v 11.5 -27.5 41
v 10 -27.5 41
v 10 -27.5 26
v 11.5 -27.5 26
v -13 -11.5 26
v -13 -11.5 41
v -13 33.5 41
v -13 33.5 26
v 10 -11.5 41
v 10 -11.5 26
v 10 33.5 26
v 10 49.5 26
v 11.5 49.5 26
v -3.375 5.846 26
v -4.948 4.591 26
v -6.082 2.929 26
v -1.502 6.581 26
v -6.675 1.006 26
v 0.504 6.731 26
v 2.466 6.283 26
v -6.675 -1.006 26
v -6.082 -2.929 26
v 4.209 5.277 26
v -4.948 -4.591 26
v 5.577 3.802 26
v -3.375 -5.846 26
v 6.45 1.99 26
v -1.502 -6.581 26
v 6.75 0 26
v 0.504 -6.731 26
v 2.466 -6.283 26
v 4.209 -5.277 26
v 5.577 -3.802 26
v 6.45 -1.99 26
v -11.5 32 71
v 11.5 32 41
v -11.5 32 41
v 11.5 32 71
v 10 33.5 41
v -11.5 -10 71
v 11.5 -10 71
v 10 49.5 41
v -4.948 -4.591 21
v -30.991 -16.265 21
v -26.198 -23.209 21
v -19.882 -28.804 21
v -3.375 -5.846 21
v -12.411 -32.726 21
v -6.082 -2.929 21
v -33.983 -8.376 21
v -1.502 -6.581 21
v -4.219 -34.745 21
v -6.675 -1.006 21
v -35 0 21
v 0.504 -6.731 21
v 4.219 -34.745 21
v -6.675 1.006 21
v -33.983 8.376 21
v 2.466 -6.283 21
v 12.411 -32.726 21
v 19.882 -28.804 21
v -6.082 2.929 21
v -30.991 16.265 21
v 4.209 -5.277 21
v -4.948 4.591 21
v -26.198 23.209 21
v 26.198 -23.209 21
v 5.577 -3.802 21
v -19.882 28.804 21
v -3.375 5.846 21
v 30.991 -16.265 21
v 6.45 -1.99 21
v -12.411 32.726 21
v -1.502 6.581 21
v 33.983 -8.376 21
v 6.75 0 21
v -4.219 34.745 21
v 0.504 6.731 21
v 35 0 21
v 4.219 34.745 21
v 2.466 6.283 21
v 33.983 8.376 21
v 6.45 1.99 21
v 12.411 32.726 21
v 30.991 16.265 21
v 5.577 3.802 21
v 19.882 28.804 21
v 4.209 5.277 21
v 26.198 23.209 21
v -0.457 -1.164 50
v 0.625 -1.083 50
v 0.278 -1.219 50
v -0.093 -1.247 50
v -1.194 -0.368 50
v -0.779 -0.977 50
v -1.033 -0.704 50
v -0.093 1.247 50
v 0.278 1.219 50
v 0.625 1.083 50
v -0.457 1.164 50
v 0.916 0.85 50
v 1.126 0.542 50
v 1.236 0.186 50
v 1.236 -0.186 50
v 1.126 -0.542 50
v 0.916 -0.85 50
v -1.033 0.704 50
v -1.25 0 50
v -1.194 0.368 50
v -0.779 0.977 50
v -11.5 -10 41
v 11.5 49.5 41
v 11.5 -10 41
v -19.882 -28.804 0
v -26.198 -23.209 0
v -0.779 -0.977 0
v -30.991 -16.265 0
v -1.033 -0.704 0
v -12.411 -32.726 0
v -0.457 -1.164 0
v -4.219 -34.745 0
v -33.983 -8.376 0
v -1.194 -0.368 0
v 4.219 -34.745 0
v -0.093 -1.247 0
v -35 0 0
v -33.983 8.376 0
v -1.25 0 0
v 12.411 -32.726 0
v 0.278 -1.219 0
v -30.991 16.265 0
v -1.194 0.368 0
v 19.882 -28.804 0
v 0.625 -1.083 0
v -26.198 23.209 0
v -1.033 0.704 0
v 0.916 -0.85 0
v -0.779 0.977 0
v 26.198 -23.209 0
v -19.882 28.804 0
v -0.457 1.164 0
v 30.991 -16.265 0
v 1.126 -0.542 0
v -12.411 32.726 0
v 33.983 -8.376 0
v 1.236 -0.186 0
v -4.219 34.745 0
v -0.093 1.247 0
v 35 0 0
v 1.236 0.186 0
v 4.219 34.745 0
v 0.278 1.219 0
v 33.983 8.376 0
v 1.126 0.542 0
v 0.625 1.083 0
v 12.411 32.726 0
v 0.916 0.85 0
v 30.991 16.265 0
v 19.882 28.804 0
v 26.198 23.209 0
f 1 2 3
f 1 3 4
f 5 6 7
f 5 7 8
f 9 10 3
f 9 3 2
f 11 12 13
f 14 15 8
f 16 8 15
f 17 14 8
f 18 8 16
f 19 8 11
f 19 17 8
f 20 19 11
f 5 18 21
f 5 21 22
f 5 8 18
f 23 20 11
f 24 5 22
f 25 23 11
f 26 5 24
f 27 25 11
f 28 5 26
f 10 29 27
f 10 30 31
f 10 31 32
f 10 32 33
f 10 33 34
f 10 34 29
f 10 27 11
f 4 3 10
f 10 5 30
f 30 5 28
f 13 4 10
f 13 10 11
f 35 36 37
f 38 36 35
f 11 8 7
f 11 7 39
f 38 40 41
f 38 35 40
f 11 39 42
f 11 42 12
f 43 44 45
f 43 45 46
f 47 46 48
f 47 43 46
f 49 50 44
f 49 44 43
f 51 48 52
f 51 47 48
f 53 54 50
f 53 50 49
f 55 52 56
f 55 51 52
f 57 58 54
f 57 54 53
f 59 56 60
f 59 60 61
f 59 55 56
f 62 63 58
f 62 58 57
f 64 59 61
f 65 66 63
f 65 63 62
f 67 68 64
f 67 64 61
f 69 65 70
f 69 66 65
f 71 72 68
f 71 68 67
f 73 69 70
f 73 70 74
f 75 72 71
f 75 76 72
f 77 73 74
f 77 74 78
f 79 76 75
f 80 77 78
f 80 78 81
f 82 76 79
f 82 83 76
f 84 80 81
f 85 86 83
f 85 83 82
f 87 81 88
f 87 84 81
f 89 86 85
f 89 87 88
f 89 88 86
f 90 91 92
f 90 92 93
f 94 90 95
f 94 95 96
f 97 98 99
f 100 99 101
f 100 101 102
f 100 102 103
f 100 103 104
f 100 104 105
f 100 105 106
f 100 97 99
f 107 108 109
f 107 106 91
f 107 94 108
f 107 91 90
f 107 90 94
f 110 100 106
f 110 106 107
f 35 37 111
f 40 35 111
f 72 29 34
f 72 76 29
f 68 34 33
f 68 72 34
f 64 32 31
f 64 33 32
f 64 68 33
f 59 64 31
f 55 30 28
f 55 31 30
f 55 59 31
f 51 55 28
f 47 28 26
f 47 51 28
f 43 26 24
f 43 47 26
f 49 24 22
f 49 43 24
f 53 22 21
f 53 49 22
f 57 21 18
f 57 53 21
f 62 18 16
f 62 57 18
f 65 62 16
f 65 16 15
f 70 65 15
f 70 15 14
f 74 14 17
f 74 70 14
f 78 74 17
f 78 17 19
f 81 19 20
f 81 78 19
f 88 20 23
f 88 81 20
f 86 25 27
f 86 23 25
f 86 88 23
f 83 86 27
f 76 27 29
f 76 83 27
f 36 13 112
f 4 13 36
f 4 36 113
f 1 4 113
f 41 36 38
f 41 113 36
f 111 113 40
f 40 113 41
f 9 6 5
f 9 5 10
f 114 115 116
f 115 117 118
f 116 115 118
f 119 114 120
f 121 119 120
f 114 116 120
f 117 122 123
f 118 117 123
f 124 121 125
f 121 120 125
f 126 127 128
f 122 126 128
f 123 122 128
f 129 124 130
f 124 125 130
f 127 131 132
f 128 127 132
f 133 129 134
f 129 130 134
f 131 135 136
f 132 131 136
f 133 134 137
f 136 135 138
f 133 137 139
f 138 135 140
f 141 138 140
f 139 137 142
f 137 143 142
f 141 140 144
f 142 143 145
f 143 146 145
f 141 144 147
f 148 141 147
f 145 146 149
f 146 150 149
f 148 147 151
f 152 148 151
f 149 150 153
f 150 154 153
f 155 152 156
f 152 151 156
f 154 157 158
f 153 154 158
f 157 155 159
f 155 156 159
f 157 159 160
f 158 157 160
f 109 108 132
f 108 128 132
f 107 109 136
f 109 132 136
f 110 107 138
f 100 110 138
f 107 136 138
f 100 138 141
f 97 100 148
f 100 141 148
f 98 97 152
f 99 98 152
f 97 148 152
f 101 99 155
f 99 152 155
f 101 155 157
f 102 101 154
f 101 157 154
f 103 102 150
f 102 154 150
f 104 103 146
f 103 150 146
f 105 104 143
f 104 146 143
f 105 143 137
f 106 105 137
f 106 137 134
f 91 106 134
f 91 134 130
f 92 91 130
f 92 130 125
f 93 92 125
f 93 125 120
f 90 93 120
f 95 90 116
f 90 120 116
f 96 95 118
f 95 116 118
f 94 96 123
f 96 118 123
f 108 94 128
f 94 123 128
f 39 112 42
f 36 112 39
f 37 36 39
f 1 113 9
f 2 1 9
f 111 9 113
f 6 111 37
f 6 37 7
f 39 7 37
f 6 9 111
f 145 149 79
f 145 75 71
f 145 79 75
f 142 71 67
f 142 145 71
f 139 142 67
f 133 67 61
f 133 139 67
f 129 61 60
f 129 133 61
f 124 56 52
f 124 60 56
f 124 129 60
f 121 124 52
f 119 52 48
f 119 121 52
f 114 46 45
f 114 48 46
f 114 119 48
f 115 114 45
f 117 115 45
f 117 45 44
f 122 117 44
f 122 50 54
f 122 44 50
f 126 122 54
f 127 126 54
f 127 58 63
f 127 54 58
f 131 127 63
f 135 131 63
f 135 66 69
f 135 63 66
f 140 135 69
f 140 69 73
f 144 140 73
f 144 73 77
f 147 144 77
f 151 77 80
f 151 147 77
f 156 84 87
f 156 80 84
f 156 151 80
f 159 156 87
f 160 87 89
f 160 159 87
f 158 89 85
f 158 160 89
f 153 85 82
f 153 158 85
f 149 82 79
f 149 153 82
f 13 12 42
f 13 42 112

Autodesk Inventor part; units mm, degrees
ref_plane "YZ Plane" through (0, 0, 0) normal (1, 0, 0) x (0, 1, 0)
ref_plane "XZ Plane" through (0, 0, 0) normal (0, 1, 0) x (-1, 0, 0)
ref_plane "XY Plane" through (0, 0, 0) normal (0, 0, 1) x (1, 0, 0)
sketch "Sketch1" plane through (0, 0, 0) normal (0, 0, 1) x (1, 0, 0)
  circle A0 centre (0, 0) radius 35
  dimension "d0" = 70
extrude "Extrusion1" add sketch "Sketch1" along normal blind 21
sketch "Sketch2" plane through (0, 0, 21) normal (0, 0, 1) x (1, 0, 0)
  circle A0 centre (0, 0) radius 6.75
  dimension "d3" = 13.5
extrude "Extrusion2" add sketch "Sketch2" along normal blind 5
sketch "Sketch3" plane through (0, 0, 26) normal (0, 0, 1) x (1, 0, 0)
  line L0 (-11.5, -10) -> (11.5, -10)
  line L1 (11.5, -10) -> (11.5, 32)
  line L2 (11.5, 32) -> (-11.5, 32)
  line L3 (-11.5, 32) -> (-11.5, -10)
  point P0 (0, 0)
  point P1 (0, -10)
  dimension "d6" = 42
  dimension "d7" = 23
  dimension "d8" = 10
extrude "Extrusion3" add sketch "Sketch3" along normal blind 45
sketch "Sketch4" plane through (-11.5, -10, 26) normal (-1, 0, 0) x (0, 0, 1)
  line L0 (0, 0) -> (0, 42) projected
  line L1 (0, 42) -> (45, 42) projected
  line L2 (0, 0) -> (15, 0)
  line L3 (15, 0) -> (15, 42)
  line L4 (15, 42) -> (0, 42)
  line L5 (0, 42) -> (0, 0)
  point P0 (-26, 10)
  dimension "d11" = 15
extrude "Extrusion4" add sketch "Sketch4" along normal blind 1.5
sketch "Sketch5" plane through (-11.5, 32, 71) normal (0, 1, 0) x (1, 0, 0)
  line L0 (-1.5, 45) -> (-1.5, 30) projected
  line L1 (-1.5, 30) -> (23, 30)
  line L2 (23, 30) -> (23, 45)
  line L3 (23, 45) -> (-1.5, 45)
  line L4 (-1.5, 45) -> (-1.5, 30)
  point P0 (11.5, 71)
extrude "Extrusion5" add sketch "Sketch5" along normal blind 1.5
sketch "Sketch6" plane through (-11.5, -10, 71) normal (0, -1, 0) x (1, 0, 0)
  line L0 (23, -30) -> (0, -30) projected
  line L1 (-1.5, -45) -> (23, -45)
  line L2 (23, -45) -> (23, -30)
  line L3 (23, -30) -> (-1.5, -30)
  line L4 (-1.5, -30) -> (-1.5, -45)
  point P0 (11.5, -71)
extrude "Extrusion6" add sketch "Sketch6" along normal blind 1.5
sketch "Sketch7" plane through (-11.5, -11.5, 71) normal (0, -1, 0) x (1, 0, 0)
  line L0 (23, -45) -> (-1.5, -45) projected
  line L1 (-1.5, -30) -> (23, -30) projected
  line L2 (23, -45) -> (21.5, -45)
  line L3 (21.5, -45) -> (21.5, -30)
  line L4 (21.5, -30) -> (23, -30)
  line L5 (23, -30) -> (23, -45)
  point P0 (11.5, -71)
  dimension "d18" = 1.5
extrude "Extrusion7" add sketch "Sketch7" along normal blind 16
sketch "Sketch8" plane through (-11.5, 33.5, 71) normal (0, 1, 0) x (1, 0, 0)
  line L0 (-1.5, 45) -> (21.5, 45) projected
  line L1 (23, 30) -> (21.5, 30)
  line L2 (21.5, 30) -> (21.5, 45)
  line L3 (21.5, 45) -> (23, 45)
  line L4 (23, 45) -> (23, 30)
  point P0 (11.5, 71)
  dimension "d21" = 1.5
extrude "Extrusion8" add sketch "Sketch8" along normal blind 16
sketch "Sketch9" plane through (0, 0, 0) normal (0, 0, -1) x (-1, 0, 0)
  circle A0 centre (0, 0) radius 1.25
  dimension "d24" = 2.5
extrude "Extrusion9" cut sketch "Sketch9" against normal blind 50
properties part number "Rueda Derecha"
